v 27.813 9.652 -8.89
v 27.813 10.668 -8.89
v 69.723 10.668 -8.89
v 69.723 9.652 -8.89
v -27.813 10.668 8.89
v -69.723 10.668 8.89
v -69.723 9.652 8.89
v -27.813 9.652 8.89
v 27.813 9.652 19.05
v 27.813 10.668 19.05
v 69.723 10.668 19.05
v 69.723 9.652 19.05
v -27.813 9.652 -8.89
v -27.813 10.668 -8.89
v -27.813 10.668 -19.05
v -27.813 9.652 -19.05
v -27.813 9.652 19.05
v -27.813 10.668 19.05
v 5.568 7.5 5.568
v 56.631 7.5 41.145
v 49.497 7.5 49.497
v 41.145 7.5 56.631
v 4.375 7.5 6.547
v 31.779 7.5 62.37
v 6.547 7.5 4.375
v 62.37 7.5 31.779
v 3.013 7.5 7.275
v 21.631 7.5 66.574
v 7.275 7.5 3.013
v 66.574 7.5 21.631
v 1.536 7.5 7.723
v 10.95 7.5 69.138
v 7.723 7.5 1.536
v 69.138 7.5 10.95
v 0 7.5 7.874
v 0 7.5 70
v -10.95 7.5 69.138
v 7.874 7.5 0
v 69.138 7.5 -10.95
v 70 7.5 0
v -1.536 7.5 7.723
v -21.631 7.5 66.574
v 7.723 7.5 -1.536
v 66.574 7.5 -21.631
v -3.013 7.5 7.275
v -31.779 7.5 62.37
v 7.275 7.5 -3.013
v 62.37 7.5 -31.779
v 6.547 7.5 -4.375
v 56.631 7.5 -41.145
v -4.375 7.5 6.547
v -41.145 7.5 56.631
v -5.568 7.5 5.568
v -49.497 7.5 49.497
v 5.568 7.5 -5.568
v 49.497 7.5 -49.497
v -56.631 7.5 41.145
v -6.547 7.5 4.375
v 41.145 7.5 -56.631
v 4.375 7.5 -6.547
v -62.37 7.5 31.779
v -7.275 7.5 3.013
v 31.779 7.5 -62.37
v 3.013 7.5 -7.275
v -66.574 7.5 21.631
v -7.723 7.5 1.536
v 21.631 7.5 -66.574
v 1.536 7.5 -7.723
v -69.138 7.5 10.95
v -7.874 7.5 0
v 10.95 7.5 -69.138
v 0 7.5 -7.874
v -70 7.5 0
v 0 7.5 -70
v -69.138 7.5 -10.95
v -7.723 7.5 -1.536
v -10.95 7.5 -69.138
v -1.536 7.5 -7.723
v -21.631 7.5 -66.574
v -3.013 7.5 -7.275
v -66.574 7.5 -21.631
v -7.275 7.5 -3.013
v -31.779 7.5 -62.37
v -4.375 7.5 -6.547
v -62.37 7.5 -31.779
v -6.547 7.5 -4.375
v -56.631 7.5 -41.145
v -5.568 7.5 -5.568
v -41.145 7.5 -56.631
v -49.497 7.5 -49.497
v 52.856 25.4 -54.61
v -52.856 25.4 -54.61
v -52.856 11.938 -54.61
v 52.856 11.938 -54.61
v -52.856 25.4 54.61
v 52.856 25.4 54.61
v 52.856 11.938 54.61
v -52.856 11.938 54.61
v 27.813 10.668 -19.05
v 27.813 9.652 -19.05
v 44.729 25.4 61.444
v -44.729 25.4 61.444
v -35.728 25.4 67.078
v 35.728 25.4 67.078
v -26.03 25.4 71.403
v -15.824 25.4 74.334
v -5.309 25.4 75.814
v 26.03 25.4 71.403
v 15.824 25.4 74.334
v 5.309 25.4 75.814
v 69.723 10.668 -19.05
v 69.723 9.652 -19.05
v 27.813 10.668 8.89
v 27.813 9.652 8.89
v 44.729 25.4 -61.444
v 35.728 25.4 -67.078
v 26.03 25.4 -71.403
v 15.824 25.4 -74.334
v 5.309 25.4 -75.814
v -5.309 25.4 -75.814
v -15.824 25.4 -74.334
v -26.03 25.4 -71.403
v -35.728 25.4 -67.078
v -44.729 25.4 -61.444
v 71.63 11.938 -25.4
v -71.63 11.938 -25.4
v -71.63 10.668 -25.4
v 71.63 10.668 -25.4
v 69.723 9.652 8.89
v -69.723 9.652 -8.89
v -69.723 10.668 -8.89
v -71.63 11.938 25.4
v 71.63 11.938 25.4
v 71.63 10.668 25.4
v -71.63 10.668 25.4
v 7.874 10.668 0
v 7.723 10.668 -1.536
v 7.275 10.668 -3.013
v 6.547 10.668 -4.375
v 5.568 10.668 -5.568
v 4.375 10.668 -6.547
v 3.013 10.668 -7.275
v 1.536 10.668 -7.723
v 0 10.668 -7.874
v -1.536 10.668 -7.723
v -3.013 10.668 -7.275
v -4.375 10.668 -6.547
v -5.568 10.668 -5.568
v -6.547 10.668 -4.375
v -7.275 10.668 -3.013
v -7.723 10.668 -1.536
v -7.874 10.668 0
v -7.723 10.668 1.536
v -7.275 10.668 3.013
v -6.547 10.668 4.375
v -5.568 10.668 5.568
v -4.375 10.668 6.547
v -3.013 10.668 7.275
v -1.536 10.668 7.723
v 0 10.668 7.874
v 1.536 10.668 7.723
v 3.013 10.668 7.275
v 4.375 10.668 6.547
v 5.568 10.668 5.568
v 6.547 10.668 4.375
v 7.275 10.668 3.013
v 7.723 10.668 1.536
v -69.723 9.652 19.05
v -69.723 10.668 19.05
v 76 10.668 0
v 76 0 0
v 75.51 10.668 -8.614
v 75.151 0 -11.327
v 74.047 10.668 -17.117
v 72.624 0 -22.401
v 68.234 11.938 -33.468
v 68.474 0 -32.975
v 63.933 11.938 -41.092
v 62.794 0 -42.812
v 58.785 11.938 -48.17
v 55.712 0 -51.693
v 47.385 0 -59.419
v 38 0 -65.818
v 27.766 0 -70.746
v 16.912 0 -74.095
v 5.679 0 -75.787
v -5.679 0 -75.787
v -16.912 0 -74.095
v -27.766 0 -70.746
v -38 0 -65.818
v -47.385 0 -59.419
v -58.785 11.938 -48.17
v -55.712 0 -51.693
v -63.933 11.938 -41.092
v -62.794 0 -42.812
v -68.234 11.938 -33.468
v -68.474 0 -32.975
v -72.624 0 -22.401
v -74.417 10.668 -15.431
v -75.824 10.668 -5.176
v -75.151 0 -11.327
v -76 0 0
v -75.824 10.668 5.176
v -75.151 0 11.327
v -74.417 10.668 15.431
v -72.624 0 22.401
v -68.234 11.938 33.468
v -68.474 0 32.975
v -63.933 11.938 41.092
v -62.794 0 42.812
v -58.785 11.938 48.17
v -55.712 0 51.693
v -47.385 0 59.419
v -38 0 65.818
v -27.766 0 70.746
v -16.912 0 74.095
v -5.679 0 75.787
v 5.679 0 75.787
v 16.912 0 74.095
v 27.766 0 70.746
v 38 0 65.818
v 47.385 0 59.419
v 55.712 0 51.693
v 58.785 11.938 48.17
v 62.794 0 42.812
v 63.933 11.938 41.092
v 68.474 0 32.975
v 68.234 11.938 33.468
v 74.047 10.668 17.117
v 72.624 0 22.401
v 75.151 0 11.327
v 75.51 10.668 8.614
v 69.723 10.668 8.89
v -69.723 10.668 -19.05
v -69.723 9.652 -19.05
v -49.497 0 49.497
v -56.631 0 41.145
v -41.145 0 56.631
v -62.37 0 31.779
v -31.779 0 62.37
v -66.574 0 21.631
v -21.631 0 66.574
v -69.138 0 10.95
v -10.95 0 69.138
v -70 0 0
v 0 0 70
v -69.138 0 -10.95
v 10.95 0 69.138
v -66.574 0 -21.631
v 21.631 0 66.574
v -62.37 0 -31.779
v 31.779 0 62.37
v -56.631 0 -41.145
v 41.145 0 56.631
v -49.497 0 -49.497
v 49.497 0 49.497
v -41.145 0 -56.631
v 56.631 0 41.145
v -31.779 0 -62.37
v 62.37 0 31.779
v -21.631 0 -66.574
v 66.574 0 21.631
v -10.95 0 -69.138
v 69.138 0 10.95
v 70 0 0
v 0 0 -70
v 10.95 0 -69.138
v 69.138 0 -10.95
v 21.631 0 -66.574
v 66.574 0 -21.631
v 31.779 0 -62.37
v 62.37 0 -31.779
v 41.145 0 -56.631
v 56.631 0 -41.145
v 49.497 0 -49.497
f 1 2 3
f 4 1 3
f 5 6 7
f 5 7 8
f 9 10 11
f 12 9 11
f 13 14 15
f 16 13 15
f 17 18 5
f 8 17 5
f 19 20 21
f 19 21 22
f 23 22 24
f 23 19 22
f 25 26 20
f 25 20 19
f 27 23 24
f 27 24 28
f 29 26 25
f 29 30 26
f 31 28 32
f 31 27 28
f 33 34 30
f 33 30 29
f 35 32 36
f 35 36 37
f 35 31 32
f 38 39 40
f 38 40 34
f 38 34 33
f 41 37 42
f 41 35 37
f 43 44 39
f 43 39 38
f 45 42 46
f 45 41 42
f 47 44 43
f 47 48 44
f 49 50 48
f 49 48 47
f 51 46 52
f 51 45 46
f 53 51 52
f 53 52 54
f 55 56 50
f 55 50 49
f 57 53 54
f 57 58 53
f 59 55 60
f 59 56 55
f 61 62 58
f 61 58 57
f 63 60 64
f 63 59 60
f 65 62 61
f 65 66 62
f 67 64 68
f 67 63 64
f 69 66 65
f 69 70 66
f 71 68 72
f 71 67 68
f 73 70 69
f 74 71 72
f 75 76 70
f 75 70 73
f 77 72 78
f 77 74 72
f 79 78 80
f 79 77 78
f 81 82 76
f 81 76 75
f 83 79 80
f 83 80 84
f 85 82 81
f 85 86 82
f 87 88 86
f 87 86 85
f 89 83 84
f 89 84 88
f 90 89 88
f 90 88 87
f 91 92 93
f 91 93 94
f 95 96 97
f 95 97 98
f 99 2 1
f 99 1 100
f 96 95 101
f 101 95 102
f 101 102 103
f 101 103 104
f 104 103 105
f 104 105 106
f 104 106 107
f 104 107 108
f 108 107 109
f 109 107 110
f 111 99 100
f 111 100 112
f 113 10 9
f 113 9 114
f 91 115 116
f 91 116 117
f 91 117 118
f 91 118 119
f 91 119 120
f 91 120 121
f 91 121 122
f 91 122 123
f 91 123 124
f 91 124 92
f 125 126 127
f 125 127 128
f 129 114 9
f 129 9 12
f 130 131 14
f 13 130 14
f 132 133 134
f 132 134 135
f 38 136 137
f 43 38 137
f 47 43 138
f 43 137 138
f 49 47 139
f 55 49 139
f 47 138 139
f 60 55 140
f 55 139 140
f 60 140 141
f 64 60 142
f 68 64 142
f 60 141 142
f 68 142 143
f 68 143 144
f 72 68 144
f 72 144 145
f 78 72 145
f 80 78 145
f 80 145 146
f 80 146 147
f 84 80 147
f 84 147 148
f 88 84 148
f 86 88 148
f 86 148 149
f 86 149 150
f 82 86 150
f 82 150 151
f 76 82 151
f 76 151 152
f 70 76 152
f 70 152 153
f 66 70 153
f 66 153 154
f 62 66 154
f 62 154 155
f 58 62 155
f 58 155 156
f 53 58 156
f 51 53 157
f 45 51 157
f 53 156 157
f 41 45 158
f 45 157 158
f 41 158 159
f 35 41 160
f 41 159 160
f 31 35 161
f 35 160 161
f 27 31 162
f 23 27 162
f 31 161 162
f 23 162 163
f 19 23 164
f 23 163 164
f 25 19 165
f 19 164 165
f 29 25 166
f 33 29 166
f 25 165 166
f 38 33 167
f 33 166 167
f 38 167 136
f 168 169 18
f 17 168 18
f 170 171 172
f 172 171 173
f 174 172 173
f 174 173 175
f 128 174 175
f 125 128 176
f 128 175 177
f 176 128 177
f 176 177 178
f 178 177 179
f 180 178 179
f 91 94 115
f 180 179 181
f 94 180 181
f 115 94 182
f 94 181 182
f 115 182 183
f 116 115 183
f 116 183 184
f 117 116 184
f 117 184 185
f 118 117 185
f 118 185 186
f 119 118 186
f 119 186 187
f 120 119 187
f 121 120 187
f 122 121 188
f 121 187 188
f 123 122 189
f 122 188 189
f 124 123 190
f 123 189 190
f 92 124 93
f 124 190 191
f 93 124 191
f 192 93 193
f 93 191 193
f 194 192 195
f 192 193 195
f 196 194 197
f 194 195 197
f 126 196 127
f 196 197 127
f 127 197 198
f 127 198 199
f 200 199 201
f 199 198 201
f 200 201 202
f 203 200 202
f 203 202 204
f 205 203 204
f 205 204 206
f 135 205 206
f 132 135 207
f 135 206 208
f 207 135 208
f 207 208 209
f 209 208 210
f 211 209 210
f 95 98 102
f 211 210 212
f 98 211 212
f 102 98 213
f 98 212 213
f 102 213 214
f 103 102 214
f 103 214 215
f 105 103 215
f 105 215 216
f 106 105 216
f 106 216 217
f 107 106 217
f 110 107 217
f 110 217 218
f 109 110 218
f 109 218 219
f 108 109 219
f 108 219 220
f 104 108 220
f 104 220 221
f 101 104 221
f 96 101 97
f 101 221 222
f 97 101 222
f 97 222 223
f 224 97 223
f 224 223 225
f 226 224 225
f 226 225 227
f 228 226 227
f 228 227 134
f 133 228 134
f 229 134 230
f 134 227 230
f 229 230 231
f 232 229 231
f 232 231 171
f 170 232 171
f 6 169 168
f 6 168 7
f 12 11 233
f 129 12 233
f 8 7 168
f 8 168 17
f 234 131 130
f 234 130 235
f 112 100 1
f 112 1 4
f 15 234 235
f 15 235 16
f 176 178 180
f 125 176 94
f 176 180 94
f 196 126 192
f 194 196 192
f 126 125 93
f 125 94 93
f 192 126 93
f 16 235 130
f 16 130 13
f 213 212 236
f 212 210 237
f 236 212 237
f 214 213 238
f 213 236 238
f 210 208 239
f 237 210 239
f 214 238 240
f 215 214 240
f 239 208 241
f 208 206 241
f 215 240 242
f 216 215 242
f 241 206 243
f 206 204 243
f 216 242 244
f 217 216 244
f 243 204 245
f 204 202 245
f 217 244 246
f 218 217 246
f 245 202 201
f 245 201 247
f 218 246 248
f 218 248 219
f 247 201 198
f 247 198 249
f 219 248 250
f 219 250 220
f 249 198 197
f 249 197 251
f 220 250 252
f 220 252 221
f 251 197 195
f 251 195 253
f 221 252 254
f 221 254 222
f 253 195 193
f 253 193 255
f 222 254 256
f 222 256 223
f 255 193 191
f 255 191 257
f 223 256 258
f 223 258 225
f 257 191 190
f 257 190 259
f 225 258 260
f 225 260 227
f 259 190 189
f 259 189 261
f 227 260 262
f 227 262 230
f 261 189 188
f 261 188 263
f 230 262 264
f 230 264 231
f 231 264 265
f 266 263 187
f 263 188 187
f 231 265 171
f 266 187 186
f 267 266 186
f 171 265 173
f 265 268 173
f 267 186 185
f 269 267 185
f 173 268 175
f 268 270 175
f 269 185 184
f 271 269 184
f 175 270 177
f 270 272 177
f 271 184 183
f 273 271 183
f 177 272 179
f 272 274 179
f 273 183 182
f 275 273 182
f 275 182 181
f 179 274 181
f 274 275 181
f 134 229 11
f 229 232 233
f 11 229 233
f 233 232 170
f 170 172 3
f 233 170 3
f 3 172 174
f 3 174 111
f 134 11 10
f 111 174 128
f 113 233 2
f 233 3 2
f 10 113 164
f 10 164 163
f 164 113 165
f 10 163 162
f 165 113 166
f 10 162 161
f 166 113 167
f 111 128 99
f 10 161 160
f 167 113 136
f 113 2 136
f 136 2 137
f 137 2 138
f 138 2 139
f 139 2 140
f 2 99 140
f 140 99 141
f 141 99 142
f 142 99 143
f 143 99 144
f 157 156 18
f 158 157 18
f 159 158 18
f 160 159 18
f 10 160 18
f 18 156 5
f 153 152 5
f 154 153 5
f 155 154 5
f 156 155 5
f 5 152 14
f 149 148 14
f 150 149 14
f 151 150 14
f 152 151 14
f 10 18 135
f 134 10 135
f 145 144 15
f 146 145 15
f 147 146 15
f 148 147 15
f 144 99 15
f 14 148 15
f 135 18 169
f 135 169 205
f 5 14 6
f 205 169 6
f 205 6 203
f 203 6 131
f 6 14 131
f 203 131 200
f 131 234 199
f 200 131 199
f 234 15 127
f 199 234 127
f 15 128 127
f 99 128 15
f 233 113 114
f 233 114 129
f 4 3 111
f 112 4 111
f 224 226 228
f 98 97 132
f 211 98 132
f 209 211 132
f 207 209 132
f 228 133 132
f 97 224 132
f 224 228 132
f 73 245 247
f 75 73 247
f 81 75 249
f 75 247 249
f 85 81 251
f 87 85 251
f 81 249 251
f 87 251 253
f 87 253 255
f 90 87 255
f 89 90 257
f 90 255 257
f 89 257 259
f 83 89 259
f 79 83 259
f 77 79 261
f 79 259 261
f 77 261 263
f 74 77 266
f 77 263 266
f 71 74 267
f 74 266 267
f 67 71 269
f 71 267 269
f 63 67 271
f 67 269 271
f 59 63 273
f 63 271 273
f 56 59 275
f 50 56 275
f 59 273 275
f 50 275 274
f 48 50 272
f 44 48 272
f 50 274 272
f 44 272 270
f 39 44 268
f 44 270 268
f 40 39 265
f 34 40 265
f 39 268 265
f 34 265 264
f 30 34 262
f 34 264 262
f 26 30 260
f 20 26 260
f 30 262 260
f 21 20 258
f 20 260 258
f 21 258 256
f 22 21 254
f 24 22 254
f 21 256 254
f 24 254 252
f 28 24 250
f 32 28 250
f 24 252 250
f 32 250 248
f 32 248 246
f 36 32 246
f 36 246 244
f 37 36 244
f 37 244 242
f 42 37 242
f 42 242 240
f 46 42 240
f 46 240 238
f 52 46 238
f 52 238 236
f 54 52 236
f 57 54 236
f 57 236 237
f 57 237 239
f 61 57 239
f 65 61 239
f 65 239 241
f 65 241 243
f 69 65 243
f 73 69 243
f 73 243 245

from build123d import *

# Parameters (mm, degrees)
SKETCH1_R           = 76
BOSS_EXTRUDE1_DEPTH = 25.4
CUT_EXTRUDE4_DEPTH  = 13.462
SKETCH5_R           = 7.874
CUT_EXTRUDE5_DEPTH  = 20
SKETCH13_R          = 70
CUT_EXTRUDE9_DEPTH  = 7.5
CUT_EXTRUDE11_DEPTH = 1.27
SKETCH16_W          = 41.91
SKETCH16_H          = 10.16
CUT_EXTRUDE12_DEPTH = 1.016


with BuildPart() as part:
    # Sketch1 → Boss-Extrude1 (new body)
    with BuildSketch(Plane(origin=(0, 0, 0), x_dir=(1, 0, 0), z_dir=(0, 1, 0))):
        Circle(SKETCH1_R)
    extrude(amount=BOSS_EXTRUDE1_DEPTH)

    # Sketch2 → Cut-Extrude4 (cut)
    with BuildSketch(Plane(origin=(0, 25.4, 0), x_dir=(1, 0, 0), z_dir=(0, 1, 0))):
        with BuildLine():
            Line((-58.007955522, 54.61), (58.007955522, 54.61))
            ThreePointArc((58.007955522, 54.61), (112.617955522, 0), (58.007955522, -54.61))
            Line((58.007955522, -54.61), (-58.007955522, -54.61))
            ThreePointArc((-58.007955522, -54.61), (-112.617955522, 0), (-58.007955522, 54.61))
        make_face()
    extrude(amount=-CUT_EXTRUDE4_DEPTH, mode=Mode.SUBTRACT)

    # Sketch5 → Cut-Extrude5 (cut)
    with BuildSketch(Plane(origin=(0, 11.938, 0), x_dir=(1, 0, 0), z_dir=(0, 1, 0))):
        Circle(SKETCH5_R)
    extrude(amount=-CUT_EXTRUDE5_DEPTH, mode=Mode.SUBTRACT)

    # Sketch13 → Cut-Extrude9 (cut)
    with BuildSketch(Plane(origin=(0, 0, 0), x_dir=(-1, 0, 0), z_dir=(0, -1, 0))):
        Circle(SKETCH13_R)
    extrude(amount=-CUT_EXTRUDE9_DEPTH, mode=Mode.SUBTRACT)

    # Sketch15 → Cut-Extrude11 (cut)
    with BuildSketch(Plane(origin=(0, 11.938, 0), x_dir=(1, 0, 0), z_dir=(0, 1, 0))):
        with BuildLine():
            Line((76, -25.4), (-76, -25.4))
            ThreePointArc((-76, -25.4), (-101.4, 0), (-76, 25.4))
            Line((-76, 25.4), (76, 25.4))
            ThreePointArc((76, 25.4), (101.4, 0), (76, -25.4))
        make_face()
    extrude(amount=-CUT_EXTRUDE11_DEPTH, mode=Mode.SUBTRACT)

    # Sketch16 → Cut-Extrude12 (cut)
    with BuildSketch(Plane(origin=(0, 10.668, 0), x_dir=(1, 0, 0), z_dir=(0, 1, 0))):
        with Locations((-48.768, -13.97)):
            Rectangle(SKETCH16_W, SKETCH16_H)
        with Locations((-48.768, 13.97)):
            Rectangle(SKETCH16_W, SKETCH16_H)
        with Locations((48.768, -13.97)):
            Rectangle(SKETCH16_W, SKETCH16_H)
        with Locations((48.768, 13.97)):
            Rectangle(SKETCH16_W, SKETCH16_H)
    extrude(amount=-CUT_EXTRUDE12_DEPTH, mode=Mode.SUBTRACT)


solid = part.part
